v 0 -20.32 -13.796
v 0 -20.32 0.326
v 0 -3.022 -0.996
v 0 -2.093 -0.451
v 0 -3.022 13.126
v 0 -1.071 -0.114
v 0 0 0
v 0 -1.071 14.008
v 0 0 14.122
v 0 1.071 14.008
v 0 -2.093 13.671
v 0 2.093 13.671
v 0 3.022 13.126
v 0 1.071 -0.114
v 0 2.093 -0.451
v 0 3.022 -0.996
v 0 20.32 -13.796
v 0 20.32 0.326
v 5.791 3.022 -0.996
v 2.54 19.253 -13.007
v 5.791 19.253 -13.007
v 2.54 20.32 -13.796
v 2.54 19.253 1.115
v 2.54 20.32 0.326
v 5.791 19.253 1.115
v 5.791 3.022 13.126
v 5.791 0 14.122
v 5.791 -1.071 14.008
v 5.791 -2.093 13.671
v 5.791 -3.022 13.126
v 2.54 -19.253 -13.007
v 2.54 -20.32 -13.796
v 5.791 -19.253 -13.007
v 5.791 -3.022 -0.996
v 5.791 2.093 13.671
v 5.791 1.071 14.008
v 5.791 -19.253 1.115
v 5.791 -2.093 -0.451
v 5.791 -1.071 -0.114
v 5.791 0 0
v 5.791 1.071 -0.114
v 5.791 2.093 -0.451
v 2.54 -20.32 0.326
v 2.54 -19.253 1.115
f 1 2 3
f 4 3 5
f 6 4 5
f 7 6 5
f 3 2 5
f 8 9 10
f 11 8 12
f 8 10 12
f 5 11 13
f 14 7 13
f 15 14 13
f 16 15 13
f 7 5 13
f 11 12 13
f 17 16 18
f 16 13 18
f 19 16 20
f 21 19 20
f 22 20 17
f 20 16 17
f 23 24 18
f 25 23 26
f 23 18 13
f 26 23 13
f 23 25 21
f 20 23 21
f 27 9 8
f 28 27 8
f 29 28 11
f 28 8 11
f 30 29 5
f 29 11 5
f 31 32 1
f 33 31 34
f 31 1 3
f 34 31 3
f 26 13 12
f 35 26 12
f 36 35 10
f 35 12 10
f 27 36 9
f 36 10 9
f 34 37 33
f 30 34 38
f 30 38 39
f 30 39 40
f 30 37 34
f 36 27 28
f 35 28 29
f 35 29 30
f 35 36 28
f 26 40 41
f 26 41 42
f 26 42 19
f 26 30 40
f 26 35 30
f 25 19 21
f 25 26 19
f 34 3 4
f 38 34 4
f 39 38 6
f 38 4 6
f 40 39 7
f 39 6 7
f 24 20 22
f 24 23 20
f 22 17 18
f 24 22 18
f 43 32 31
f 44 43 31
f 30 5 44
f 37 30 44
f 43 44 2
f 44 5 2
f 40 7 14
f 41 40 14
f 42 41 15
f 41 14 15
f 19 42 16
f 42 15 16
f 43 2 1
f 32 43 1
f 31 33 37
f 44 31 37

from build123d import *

# Parameters (mm, degrees)
F1_DEPTH = 5.7912
F3_DEPTH = 3.2512


with BuildPart() as f1:
    # F0 (on Right) → F1 (new body)
    with BuildSketch(Plane.YZ):
        with BuildLine():
            Line((20.32, 0.3259240077), (3.0216997567, 13.1259928519))
            ThreePointArc((3.0216997567, 13.1259928519), (1.5908721369, 13.8668715611), (0, 14.1224))
            ThreePointArc((0, 14.1224), (-1.5908721369, 13.8668715611), (-3.0216997567, 13.1259928519))
            Line((-3.0216997567, 13.1259928519), (-20.32, 0.3259240077))
            Line((-20.32, 0.3259240077), (-20.32, -13.7964759923))
            Line((-20.32, -13.7964759923), (-3.0216997567, -0.9964071481))
            ThreePointArc((-3.0216997567, -0.9964071481), (-1.5908721369, -0.2555284389), (0, 0))
            ThreePointArc((0, 0), (1.5908721369, -0.2555284389), (3.0216997567, -0.9964071481))
            Line((3.0216997567, -0.9964071481), (20.32, -13.7964759923))
            Line((20.32, -13.7964759923), (20.32, 0.3259240077))
        make_face()
    extrude(amount=F1_DEPTH)

    # F2 (on face) → F3 (cut)
    with BuildSketch(Plane.YZ.offset(5.7912)):
        Polygon((19.2532, -13.0070855174), (20.32, -13.7964759923), (20.32, 0.3259240077), (19.2532, 1.1153144826), align=None)
        Polygon((-19.2532, -13.0070855174), (-19.2532, 1.1153144826), (-20.32, 0.3259240077), (-20.32, -13.7964759923), align=None)
    extrude(amount=-F3_DEPTH, mode=Mode.SUBTRACT)


solid = f1.part
